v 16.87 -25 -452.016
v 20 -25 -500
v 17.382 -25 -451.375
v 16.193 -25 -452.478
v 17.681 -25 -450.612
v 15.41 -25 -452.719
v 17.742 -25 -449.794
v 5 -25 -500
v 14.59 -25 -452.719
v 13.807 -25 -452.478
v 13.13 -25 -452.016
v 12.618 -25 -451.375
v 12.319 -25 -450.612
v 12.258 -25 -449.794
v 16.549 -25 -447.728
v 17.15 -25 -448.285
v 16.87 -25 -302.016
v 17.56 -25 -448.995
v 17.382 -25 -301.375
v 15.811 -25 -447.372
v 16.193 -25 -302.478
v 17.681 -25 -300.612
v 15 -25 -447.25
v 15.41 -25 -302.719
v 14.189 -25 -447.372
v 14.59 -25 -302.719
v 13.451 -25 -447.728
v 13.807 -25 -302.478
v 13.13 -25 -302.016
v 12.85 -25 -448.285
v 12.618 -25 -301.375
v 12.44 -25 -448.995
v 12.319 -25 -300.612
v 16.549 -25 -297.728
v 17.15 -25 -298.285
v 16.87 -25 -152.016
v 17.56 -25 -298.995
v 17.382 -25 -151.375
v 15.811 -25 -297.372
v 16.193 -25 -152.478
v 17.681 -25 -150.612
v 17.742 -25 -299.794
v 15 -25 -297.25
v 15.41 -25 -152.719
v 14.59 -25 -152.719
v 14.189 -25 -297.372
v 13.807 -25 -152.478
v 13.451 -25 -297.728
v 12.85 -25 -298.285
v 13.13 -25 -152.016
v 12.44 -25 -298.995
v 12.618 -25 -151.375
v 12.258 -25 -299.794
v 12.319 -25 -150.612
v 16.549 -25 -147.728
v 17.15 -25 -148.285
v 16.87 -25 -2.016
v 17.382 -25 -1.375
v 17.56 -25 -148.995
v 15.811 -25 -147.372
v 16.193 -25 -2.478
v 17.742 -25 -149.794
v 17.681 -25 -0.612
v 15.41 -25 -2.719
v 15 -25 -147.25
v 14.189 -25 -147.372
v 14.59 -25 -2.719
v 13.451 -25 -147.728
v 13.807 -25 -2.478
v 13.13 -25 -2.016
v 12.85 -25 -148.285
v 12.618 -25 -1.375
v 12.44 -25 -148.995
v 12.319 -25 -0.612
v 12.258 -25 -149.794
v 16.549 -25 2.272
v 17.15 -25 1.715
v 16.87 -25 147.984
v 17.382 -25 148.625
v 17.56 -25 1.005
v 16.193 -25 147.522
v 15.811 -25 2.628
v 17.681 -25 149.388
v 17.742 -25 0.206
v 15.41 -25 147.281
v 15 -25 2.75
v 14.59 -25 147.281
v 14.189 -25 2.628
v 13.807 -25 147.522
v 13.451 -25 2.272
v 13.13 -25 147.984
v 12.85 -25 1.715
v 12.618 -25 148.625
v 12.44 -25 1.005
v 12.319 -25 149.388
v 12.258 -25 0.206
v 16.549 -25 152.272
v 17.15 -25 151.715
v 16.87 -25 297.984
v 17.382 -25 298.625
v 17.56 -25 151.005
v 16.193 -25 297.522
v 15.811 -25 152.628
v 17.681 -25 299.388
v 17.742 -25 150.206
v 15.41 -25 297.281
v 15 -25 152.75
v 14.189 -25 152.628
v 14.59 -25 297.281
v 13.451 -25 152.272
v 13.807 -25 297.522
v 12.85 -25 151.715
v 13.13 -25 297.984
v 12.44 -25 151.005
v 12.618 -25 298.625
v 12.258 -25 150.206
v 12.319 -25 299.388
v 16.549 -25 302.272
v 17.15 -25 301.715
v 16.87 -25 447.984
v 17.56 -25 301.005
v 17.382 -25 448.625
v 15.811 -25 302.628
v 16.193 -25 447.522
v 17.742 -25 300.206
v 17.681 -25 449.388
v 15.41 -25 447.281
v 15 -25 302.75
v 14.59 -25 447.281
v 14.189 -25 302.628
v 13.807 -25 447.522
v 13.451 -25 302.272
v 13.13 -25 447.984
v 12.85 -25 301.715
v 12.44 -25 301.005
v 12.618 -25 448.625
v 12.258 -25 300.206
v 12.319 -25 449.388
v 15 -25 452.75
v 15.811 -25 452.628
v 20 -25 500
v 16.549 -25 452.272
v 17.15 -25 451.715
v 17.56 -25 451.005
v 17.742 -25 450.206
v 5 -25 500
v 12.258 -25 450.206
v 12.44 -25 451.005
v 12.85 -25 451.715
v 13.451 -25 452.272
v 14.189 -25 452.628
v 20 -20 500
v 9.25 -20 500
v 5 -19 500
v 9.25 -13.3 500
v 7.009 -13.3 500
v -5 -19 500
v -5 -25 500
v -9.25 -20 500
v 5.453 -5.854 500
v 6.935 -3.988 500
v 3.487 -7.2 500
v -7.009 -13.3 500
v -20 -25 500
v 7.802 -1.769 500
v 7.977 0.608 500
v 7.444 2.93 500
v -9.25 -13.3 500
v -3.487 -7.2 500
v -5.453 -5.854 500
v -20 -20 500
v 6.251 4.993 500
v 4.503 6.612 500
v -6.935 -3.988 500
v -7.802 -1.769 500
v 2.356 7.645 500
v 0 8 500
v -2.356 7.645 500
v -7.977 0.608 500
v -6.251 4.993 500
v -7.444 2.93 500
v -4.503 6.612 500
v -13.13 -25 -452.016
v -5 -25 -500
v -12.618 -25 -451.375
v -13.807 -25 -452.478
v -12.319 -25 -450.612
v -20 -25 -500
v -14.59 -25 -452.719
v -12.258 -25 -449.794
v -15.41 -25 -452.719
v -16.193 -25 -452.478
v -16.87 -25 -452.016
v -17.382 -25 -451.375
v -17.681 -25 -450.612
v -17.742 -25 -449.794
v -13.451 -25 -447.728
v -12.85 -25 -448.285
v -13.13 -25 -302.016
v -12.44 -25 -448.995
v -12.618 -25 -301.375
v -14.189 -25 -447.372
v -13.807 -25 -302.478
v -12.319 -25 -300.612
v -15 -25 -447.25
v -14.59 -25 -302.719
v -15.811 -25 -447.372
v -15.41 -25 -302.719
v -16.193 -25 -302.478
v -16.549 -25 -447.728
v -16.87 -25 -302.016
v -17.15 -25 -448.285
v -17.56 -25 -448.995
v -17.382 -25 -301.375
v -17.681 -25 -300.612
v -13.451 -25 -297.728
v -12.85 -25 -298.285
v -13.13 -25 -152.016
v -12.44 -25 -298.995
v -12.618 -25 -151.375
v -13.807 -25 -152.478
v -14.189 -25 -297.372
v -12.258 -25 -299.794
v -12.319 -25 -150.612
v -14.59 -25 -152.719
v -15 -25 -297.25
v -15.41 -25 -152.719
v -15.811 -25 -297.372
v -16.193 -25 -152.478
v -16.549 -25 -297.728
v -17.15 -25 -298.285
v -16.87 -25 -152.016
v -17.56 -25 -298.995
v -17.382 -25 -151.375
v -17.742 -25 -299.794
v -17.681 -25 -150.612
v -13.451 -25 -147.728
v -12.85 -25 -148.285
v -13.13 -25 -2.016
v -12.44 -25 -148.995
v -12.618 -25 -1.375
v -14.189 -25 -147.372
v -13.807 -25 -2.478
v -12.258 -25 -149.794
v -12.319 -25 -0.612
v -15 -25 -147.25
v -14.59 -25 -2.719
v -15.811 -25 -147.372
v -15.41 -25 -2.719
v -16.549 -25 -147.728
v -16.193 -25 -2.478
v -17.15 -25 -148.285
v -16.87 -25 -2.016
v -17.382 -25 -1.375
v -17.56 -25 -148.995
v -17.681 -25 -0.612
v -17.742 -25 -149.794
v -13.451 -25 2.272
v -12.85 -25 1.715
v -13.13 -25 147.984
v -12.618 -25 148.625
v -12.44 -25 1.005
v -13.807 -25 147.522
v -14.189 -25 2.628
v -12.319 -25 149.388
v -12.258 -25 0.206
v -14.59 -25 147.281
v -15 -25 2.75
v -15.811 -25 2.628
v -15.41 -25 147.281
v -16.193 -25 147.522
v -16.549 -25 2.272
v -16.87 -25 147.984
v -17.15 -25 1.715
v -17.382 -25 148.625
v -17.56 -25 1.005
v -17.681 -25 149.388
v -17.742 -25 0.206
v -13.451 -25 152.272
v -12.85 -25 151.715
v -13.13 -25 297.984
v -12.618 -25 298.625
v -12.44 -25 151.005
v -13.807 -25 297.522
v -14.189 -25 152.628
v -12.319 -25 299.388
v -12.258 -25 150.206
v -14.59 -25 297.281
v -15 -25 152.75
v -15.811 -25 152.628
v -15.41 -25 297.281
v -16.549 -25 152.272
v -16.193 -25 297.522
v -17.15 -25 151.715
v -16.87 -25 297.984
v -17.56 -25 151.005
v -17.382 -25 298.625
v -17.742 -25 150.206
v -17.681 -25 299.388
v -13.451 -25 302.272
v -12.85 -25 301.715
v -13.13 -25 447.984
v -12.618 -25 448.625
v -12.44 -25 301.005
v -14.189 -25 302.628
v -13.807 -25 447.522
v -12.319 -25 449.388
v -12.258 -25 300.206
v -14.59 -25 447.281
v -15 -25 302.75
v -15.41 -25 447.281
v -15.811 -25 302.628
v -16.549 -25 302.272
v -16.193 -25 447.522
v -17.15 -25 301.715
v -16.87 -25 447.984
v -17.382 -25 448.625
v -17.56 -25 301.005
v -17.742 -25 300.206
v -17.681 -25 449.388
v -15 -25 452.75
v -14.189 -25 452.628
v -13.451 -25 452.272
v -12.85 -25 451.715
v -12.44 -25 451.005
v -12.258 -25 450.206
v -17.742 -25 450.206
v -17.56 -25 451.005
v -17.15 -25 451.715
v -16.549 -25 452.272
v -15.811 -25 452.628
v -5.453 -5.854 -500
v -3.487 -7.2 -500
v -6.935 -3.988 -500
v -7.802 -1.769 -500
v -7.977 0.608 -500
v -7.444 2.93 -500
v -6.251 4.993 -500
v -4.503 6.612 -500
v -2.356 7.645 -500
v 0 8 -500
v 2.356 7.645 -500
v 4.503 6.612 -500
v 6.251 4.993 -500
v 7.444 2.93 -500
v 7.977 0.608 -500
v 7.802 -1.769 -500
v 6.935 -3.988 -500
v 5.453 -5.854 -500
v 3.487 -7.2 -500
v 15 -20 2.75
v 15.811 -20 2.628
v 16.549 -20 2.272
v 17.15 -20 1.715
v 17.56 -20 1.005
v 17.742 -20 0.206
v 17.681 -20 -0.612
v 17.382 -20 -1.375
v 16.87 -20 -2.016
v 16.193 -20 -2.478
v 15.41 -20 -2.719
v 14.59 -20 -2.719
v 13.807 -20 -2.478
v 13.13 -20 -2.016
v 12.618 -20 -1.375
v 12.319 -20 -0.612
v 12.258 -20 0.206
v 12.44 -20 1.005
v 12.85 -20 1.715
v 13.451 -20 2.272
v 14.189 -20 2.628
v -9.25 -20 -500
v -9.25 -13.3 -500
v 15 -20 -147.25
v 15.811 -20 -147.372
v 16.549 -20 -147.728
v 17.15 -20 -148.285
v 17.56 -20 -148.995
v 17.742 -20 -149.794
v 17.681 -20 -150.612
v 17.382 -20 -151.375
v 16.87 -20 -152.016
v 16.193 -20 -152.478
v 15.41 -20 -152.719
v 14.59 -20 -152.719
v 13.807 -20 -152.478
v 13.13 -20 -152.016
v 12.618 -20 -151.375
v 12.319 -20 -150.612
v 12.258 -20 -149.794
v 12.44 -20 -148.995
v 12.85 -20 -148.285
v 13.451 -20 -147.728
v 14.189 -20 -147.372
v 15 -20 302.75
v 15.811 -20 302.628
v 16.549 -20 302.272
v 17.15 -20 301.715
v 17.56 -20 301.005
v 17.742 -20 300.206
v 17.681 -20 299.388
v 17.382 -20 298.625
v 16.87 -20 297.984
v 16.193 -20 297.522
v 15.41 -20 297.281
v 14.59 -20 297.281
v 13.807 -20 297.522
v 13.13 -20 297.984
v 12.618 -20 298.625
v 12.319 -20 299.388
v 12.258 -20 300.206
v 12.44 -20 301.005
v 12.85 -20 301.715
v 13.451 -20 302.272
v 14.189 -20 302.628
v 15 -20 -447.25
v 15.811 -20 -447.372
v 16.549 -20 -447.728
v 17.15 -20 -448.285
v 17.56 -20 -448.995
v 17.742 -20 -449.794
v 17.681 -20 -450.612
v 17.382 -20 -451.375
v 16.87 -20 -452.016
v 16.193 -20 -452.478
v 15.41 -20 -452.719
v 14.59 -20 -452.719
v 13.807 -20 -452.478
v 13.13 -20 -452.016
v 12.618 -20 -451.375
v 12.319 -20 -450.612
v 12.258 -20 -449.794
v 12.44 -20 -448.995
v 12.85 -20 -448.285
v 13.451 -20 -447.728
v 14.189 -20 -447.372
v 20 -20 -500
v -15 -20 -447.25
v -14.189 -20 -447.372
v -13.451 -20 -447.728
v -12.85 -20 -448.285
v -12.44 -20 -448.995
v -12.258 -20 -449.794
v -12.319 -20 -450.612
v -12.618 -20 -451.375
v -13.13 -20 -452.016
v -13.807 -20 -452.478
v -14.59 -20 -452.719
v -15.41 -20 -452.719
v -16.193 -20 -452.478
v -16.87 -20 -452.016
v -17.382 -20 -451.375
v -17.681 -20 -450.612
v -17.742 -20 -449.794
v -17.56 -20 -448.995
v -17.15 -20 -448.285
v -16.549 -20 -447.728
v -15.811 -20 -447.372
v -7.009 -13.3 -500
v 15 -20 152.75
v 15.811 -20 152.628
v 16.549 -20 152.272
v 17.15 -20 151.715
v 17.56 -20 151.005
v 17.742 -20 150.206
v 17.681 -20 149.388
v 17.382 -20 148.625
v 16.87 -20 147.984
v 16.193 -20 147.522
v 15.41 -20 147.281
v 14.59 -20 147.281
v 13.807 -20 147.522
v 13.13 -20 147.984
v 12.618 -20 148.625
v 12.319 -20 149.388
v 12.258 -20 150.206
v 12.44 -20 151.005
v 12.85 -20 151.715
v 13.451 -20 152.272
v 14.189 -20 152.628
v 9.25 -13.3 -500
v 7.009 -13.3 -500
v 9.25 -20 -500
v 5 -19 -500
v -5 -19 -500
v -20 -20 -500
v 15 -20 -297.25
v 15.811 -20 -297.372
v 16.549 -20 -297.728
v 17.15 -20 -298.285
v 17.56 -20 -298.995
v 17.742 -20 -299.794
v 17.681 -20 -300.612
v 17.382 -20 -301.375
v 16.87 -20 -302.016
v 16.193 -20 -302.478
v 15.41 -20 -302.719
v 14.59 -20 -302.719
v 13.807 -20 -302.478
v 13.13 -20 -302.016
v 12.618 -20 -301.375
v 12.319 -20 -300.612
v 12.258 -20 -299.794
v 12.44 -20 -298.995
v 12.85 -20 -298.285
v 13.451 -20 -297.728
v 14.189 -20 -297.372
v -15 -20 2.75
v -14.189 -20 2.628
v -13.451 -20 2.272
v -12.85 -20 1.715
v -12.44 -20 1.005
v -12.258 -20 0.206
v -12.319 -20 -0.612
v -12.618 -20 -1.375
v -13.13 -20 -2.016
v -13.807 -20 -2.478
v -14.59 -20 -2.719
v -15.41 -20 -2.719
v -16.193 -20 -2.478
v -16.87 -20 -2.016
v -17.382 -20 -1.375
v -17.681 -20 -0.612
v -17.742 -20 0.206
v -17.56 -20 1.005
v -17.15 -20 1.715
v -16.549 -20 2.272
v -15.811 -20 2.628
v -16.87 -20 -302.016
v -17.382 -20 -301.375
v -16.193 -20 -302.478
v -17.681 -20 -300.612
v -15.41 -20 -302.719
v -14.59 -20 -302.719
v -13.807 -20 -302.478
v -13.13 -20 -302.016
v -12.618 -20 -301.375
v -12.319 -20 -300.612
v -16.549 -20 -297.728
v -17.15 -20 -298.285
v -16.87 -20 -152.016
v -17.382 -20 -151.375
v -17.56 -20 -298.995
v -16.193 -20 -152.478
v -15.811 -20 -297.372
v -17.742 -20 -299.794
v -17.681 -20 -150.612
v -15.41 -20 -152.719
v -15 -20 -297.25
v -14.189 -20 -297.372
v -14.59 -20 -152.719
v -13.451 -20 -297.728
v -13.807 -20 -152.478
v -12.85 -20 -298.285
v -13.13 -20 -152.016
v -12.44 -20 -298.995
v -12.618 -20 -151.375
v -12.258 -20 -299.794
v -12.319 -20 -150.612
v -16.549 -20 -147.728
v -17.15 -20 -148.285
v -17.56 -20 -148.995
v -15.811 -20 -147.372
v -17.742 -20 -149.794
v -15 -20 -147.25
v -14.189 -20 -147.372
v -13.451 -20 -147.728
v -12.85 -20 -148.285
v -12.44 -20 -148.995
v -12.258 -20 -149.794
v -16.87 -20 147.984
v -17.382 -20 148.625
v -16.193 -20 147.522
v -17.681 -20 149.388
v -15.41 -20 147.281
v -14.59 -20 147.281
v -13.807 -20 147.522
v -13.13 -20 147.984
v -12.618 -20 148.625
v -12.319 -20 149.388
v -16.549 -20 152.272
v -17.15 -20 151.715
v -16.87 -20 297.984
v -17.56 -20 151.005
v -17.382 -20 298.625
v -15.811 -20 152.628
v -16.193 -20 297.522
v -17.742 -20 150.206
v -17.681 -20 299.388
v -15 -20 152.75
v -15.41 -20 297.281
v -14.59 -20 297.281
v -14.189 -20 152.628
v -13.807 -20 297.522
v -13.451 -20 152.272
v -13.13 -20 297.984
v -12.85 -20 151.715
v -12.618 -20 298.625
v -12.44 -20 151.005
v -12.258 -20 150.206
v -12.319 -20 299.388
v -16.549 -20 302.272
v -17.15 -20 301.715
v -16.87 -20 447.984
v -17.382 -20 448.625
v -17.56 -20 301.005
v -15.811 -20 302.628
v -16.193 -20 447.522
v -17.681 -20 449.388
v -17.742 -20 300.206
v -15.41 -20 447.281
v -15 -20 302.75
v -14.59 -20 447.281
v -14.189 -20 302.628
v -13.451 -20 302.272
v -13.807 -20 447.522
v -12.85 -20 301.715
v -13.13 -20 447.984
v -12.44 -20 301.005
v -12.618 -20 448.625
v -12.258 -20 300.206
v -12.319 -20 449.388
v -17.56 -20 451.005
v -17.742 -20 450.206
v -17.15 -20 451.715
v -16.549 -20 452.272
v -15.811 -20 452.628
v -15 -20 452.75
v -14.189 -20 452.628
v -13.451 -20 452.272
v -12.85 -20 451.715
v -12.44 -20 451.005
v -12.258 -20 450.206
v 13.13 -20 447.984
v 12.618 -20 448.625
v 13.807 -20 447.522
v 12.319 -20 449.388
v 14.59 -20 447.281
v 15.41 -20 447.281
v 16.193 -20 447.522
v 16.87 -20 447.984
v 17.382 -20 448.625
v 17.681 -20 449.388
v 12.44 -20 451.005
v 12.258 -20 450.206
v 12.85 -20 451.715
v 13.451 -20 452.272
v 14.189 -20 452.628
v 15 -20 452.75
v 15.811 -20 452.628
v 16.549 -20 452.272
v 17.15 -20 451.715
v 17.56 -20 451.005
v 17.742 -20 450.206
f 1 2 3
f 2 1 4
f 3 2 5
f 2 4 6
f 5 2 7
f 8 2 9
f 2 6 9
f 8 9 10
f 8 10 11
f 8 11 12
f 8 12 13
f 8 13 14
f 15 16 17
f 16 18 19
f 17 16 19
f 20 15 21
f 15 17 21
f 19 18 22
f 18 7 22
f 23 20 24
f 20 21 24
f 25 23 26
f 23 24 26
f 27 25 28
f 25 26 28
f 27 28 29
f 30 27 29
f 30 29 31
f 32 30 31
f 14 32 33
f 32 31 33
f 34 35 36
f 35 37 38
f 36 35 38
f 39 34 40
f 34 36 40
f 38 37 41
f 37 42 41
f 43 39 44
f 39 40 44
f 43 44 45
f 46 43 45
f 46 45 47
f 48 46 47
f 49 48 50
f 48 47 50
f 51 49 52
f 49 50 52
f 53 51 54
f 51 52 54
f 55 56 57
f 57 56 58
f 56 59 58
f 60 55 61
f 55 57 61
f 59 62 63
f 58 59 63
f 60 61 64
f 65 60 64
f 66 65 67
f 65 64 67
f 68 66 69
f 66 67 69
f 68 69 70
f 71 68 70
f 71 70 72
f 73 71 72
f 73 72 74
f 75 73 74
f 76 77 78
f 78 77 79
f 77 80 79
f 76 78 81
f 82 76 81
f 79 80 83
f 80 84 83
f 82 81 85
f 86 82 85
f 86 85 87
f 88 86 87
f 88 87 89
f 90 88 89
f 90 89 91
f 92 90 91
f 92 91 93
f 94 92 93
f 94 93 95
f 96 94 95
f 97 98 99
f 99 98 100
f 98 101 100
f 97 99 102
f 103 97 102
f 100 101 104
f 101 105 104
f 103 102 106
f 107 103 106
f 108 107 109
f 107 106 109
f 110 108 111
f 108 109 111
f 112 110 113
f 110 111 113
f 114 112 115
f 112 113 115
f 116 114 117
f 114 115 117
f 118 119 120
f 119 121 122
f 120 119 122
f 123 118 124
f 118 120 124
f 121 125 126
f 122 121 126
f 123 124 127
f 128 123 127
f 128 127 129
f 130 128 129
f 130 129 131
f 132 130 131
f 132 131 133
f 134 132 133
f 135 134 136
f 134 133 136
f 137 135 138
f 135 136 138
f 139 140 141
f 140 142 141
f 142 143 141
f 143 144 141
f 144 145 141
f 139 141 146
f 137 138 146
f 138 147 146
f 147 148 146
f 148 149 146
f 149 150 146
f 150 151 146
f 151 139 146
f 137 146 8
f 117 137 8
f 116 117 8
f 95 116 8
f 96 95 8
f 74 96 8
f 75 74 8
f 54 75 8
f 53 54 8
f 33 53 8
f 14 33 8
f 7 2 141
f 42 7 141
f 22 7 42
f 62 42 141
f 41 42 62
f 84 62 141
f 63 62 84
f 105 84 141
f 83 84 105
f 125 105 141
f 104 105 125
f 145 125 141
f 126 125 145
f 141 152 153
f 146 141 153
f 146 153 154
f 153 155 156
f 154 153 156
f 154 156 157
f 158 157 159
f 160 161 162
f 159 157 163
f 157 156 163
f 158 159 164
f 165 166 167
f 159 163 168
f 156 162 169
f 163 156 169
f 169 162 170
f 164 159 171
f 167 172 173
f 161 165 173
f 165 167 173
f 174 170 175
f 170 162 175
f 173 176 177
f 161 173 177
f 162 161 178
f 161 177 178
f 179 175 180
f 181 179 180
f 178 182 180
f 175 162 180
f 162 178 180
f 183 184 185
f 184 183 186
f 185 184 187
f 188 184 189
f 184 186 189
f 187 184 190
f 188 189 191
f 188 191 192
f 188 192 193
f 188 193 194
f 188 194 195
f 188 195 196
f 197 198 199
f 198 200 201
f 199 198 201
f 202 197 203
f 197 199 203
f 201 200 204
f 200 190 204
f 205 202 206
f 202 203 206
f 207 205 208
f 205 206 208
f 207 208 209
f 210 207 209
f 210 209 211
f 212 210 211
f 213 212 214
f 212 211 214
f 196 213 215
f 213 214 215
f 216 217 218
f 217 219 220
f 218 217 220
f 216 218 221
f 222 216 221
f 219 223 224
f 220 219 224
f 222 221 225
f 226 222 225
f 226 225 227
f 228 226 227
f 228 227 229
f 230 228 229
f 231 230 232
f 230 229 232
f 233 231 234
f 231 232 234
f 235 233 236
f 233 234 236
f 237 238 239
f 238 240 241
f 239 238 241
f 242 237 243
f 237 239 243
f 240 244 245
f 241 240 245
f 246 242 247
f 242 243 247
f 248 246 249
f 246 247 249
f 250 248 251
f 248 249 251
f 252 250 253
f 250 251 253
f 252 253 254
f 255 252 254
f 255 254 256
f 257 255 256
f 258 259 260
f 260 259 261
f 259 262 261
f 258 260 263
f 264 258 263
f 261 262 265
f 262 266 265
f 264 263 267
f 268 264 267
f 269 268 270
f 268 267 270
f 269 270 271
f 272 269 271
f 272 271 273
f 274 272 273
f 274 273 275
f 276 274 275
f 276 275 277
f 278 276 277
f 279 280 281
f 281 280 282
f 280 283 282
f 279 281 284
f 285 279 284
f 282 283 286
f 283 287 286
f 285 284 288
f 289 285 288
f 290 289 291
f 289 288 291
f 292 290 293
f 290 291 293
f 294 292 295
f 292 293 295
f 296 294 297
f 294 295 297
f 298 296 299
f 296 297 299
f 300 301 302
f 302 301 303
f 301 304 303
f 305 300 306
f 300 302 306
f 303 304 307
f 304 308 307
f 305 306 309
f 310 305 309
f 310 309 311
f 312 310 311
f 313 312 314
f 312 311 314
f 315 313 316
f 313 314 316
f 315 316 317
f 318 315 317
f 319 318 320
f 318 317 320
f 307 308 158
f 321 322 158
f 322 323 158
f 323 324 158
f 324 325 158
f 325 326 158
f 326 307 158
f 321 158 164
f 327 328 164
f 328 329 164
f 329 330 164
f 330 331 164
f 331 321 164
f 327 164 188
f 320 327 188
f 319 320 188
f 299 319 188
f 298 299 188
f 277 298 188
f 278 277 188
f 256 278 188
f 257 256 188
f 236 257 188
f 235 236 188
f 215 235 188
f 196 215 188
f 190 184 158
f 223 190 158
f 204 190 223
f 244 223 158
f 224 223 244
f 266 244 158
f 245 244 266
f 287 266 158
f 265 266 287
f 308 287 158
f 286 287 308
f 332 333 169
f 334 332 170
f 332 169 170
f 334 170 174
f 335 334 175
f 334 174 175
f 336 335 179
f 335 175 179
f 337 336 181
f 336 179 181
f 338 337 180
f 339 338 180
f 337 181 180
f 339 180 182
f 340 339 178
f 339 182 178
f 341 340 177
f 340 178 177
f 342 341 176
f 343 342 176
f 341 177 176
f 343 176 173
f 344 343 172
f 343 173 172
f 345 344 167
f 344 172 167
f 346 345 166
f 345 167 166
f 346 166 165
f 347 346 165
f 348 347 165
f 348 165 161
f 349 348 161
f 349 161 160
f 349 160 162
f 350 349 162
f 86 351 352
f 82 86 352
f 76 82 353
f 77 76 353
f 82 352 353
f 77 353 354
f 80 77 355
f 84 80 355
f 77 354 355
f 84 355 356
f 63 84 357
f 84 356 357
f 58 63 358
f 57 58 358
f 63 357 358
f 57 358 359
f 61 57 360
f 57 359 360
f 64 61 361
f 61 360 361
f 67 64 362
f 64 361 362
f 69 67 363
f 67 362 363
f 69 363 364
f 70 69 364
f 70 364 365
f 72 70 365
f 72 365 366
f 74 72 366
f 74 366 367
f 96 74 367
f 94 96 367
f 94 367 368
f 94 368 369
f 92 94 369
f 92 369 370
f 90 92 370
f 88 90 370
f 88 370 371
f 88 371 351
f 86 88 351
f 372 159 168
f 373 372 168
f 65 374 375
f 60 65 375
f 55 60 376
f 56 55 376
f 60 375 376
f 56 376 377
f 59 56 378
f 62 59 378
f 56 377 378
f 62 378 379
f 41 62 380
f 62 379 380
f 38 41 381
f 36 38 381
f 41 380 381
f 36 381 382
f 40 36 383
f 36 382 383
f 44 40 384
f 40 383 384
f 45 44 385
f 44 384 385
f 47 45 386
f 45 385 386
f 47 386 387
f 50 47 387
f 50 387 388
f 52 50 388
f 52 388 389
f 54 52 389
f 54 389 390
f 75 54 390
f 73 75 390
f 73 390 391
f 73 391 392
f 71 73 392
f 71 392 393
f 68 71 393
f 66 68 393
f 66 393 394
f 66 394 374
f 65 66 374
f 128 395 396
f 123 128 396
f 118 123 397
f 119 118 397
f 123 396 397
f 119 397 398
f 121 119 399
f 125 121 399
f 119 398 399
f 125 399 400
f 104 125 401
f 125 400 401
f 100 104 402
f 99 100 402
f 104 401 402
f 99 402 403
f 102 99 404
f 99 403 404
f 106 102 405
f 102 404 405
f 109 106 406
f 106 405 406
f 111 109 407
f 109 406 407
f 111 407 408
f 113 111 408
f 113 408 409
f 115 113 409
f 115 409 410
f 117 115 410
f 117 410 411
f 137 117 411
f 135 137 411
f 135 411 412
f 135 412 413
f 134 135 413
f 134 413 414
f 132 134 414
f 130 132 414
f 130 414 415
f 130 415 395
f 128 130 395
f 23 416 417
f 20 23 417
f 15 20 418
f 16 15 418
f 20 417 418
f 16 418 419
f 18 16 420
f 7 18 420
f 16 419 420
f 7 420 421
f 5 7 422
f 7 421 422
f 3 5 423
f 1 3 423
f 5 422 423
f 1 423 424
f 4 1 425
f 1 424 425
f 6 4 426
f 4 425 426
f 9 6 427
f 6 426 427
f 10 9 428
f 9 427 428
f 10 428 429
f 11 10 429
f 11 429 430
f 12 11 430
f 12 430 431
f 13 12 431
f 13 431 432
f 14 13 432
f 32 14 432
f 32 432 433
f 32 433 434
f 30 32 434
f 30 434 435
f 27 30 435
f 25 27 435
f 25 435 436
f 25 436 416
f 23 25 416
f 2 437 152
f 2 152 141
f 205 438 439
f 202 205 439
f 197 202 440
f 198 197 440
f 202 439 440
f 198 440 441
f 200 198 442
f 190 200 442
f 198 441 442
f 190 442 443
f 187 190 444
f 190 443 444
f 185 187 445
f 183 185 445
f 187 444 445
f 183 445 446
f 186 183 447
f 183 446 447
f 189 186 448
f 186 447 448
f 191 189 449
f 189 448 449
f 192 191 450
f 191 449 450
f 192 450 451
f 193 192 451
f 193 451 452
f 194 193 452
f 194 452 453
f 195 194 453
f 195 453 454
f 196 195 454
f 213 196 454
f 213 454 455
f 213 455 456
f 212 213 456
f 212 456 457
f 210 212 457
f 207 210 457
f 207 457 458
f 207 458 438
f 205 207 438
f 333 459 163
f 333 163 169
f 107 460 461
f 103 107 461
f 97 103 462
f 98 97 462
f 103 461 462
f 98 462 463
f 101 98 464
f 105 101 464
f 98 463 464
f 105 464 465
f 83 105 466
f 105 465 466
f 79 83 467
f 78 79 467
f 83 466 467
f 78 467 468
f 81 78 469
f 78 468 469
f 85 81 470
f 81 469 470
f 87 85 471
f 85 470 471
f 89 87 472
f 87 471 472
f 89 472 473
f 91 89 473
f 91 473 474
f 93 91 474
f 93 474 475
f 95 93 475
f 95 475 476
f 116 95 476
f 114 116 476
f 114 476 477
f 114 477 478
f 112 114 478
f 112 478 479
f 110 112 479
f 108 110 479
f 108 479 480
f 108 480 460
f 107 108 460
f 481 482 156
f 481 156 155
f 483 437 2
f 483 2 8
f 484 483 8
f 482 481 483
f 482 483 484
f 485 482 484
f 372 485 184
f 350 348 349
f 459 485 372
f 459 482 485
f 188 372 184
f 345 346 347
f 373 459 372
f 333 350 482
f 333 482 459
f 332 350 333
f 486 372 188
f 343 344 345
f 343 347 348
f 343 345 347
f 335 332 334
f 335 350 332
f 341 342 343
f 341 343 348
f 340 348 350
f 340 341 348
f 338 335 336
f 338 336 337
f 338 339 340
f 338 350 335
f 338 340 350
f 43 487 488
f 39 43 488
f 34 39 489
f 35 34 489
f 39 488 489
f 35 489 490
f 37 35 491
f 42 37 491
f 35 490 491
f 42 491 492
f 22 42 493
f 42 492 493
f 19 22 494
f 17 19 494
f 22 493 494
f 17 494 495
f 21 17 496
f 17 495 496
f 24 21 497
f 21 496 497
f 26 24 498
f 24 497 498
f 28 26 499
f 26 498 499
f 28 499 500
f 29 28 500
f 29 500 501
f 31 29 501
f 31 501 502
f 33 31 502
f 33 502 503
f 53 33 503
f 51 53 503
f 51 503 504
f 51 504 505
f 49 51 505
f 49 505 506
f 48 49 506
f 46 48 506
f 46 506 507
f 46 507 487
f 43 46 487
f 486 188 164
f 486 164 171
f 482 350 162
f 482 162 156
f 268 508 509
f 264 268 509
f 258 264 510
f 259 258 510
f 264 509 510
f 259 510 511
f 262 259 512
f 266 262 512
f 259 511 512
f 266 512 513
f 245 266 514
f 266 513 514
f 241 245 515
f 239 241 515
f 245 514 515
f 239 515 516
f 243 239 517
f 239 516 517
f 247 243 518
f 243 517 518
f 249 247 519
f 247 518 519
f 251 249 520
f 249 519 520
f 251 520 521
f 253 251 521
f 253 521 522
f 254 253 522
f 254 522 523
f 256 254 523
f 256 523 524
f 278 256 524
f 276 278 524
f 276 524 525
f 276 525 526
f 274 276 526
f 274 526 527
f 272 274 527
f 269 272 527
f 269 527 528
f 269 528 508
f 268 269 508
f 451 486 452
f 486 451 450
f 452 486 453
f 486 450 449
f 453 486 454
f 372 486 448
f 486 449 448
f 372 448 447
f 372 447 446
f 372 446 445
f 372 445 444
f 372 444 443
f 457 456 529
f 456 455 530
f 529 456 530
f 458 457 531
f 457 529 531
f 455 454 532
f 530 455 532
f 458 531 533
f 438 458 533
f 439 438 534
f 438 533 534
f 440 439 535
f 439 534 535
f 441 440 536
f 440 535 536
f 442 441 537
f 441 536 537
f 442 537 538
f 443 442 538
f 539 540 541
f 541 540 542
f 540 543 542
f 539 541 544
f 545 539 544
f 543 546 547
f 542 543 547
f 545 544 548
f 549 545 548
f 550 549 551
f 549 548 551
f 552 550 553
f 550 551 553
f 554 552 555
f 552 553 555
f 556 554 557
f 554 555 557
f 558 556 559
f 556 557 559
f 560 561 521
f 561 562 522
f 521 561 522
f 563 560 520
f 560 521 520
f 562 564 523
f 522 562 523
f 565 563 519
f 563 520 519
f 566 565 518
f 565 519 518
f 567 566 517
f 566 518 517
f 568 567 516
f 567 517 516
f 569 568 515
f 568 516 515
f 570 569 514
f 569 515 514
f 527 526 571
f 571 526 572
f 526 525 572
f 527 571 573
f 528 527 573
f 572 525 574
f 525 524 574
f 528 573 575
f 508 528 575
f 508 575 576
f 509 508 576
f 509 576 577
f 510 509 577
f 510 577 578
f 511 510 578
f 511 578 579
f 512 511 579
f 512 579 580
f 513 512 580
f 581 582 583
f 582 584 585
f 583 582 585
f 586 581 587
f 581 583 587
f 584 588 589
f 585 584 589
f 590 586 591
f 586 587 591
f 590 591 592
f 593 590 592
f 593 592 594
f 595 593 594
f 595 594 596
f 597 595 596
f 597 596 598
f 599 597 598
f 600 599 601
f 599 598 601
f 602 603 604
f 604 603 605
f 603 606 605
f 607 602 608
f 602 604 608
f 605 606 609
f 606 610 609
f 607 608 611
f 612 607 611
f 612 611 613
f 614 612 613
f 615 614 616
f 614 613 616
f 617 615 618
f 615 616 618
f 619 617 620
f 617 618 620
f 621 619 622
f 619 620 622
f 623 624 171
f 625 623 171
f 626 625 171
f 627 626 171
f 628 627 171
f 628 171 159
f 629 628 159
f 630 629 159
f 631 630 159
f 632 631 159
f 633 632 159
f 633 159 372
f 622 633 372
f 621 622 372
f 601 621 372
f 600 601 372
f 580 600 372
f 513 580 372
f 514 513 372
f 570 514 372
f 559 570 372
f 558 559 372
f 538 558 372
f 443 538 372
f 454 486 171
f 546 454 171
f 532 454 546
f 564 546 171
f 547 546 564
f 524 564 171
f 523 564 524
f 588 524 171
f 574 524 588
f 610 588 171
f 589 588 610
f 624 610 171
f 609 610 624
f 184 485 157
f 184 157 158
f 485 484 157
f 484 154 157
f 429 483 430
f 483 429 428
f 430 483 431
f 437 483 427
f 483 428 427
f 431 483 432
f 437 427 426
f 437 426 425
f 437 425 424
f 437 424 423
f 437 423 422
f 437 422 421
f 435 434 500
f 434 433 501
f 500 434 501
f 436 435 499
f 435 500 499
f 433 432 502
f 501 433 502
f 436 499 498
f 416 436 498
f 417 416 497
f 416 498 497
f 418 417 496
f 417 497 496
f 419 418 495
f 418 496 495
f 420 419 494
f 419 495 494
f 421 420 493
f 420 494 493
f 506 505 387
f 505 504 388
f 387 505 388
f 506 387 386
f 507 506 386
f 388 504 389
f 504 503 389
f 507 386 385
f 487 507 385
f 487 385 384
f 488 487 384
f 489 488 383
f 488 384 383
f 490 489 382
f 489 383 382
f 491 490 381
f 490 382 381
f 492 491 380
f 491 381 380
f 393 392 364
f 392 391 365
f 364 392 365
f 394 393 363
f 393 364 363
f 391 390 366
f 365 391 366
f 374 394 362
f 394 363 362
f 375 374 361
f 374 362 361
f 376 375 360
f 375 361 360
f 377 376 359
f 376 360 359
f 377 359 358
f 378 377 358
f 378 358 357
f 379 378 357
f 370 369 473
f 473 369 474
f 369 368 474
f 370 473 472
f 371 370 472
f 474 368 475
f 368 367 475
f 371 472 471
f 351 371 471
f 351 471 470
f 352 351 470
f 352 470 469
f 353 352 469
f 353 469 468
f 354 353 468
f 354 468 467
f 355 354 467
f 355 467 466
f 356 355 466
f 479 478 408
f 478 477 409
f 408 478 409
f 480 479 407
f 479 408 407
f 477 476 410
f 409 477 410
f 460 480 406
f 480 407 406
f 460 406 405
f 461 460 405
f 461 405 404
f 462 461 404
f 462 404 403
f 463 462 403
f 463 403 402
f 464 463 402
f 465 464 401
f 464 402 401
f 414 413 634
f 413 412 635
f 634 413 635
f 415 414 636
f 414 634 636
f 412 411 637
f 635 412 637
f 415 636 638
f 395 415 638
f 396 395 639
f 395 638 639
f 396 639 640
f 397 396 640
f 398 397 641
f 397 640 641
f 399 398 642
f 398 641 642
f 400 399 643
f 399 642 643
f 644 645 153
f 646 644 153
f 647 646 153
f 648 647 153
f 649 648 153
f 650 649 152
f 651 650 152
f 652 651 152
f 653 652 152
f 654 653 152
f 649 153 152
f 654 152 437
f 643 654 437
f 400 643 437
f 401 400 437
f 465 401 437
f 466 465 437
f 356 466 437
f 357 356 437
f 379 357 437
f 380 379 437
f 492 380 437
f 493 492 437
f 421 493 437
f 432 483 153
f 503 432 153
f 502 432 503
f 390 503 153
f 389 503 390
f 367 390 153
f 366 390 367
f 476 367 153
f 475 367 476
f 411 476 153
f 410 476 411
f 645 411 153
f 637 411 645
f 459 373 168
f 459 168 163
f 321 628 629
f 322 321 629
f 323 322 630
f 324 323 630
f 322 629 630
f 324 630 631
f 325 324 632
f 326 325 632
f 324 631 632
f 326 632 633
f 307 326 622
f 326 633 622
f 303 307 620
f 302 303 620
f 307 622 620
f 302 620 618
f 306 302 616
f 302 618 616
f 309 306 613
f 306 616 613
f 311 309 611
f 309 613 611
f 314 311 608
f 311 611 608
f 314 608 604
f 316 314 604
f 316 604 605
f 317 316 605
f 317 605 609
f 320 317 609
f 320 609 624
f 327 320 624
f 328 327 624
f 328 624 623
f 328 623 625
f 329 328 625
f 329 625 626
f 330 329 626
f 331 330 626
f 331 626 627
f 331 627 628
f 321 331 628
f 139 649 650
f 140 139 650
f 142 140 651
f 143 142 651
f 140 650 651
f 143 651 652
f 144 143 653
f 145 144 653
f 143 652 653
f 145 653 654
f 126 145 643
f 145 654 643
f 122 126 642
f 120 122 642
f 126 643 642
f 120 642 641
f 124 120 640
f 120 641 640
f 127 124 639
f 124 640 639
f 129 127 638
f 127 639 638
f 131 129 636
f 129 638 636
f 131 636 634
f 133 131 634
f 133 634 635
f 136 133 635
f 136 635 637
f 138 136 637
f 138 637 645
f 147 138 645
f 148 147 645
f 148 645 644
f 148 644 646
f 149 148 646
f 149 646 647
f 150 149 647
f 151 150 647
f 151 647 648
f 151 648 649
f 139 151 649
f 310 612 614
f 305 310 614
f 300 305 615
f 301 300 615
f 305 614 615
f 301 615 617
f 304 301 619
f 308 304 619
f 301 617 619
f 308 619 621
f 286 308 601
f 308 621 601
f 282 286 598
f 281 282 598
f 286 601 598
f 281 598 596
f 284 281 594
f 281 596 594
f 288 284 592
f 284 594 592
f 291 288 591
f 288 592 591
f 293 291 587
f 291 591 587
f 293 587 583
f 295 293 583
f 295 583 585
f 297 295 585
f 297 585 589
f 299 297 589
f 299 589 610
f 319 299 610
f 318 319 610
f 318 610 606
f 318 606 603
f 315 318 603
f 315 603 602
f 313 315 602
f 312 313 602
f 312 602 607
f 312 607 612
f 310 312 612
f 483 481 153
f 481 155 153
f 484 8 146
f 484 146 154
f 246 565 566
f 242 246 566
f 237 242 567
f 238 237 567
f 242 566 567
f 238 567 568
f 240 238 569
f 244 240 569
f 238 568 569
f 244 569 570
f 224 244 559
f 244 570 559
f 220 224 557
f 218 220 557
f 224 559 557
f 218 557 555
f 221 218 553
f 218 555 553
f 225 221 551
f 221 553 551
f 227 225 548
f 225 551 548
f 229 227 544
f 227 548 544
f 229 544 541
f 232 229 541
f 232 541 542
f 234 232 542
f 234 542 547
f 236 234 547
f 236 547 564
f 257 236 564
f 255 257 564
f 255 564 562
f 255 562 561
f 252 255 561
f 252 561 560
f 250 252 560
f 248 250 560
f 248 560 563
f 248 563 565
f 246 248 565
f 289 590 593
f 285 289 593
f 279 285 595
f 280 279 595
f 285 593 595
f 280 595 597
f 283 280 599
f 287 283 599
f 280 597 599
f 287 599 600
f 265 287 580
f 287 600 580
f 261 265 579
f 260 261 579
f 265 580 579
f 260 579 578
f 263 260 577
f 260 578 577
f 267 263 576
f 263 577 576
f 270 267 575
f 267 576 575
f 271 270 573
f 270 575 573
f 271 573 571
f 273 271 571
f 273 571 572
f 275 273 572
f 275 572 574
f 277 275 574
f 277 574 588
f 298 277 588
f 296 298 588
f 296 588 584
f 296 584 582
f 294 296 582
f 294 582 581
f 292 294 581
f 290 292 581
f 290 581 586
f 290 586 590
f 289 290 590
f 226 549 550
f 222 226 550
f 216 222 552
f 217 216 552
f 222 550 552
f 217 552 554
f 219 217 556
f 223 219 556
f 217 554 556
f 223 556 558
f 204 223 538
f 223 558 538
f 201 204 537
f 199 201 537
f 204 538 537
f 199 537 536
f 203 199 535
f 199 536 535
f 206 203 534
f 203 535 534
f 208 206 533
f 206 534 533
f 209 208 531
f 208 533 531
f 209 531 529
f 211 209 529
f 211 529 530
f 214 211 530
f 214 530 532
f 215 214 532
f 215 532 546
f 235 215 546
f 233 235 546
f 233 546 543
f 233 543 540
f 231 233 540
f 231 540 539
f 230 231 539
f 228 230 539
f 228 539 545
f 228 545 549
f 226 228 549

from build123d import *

# Parameters (mm, degrees)
BOSS_EXTRUDE1_DEPTH = 500
SKETCH2_R           = 2.75
CUT_EXTRUDE1_DEPTH  = 6
LPATTERN1_COUNT     = 7
LPATTERN1_PITCH     = 150


with BuildPart() as part:
    # Sketch1 → Boss-Extrude1 (new body, symmetric)
    with BuildSketch(Plane.XY):
        with BuildLine():
            Line((-7.008955797, -13.3), (-3.487119155, -7.2))
            ThreePointArc((-3.487119155, -7.2), (0, 8), (3.487119155, -7.2))
            Line((3.487119155, -7.2), (7.008955797, -13.3))
            Line((7.008955797, -13.3), (9.25, -13.3))
            Line((9.25, -13.3), (9.25, -20))
            Line((9.25, -20), (20, -20))
            Line((20, -20), (20, -25))
            Line((20, -25), (5, -25))
            Line((5, -25), (5, -19))
            Line((5, -19), (-5, -19))
            Line((-5, -19), (-5, -25))
            Line((-5, -25), (-20, -25))
            Line((-20, -25), (-20, -20))
            Line((-20, -20), (-9.25, -20))
            Line((-9.25, -20), (-9.25, -13.3))
            Line((-9.25, -13.3), (-7.008955797, -13.3))
        make_face()
    extrude(amount=BOSS_EXTRUDE1_DEPTH, both=True)

    # Sketch2 → Cut-Extrude1 (cut, through all)
    with BuildSketch(Plane(origin=(0, -20, 0), x_dir=(1, 0, 0), z_dir=(0, 1, 0))):
        with Locations(Location((15, -450, 0), (0, 0, 270))):  # turned: the seam where the file's is
            Circle(SKETCH2_R)
        with Locations(Location((-15, -450, 0), (0, 0, 270))):  # turned: the seam where the file's is
            Circle(SKETCH2_R)
    cut_extrude1 = extrude(amount=-CUT_EXTRUDE1_DEPTH, mode=Mode.SUBTRACT)

    # LPattern1: Cut-Extrude1 ×7
    with Locations(*[(0, 0, -i * LPATTERN1_PITCH) for i in range(1, LPATTERN1_COUNT)]):
        add(cut_extrude1, mode=Mode.SUBTRACT)


solid = part.part
